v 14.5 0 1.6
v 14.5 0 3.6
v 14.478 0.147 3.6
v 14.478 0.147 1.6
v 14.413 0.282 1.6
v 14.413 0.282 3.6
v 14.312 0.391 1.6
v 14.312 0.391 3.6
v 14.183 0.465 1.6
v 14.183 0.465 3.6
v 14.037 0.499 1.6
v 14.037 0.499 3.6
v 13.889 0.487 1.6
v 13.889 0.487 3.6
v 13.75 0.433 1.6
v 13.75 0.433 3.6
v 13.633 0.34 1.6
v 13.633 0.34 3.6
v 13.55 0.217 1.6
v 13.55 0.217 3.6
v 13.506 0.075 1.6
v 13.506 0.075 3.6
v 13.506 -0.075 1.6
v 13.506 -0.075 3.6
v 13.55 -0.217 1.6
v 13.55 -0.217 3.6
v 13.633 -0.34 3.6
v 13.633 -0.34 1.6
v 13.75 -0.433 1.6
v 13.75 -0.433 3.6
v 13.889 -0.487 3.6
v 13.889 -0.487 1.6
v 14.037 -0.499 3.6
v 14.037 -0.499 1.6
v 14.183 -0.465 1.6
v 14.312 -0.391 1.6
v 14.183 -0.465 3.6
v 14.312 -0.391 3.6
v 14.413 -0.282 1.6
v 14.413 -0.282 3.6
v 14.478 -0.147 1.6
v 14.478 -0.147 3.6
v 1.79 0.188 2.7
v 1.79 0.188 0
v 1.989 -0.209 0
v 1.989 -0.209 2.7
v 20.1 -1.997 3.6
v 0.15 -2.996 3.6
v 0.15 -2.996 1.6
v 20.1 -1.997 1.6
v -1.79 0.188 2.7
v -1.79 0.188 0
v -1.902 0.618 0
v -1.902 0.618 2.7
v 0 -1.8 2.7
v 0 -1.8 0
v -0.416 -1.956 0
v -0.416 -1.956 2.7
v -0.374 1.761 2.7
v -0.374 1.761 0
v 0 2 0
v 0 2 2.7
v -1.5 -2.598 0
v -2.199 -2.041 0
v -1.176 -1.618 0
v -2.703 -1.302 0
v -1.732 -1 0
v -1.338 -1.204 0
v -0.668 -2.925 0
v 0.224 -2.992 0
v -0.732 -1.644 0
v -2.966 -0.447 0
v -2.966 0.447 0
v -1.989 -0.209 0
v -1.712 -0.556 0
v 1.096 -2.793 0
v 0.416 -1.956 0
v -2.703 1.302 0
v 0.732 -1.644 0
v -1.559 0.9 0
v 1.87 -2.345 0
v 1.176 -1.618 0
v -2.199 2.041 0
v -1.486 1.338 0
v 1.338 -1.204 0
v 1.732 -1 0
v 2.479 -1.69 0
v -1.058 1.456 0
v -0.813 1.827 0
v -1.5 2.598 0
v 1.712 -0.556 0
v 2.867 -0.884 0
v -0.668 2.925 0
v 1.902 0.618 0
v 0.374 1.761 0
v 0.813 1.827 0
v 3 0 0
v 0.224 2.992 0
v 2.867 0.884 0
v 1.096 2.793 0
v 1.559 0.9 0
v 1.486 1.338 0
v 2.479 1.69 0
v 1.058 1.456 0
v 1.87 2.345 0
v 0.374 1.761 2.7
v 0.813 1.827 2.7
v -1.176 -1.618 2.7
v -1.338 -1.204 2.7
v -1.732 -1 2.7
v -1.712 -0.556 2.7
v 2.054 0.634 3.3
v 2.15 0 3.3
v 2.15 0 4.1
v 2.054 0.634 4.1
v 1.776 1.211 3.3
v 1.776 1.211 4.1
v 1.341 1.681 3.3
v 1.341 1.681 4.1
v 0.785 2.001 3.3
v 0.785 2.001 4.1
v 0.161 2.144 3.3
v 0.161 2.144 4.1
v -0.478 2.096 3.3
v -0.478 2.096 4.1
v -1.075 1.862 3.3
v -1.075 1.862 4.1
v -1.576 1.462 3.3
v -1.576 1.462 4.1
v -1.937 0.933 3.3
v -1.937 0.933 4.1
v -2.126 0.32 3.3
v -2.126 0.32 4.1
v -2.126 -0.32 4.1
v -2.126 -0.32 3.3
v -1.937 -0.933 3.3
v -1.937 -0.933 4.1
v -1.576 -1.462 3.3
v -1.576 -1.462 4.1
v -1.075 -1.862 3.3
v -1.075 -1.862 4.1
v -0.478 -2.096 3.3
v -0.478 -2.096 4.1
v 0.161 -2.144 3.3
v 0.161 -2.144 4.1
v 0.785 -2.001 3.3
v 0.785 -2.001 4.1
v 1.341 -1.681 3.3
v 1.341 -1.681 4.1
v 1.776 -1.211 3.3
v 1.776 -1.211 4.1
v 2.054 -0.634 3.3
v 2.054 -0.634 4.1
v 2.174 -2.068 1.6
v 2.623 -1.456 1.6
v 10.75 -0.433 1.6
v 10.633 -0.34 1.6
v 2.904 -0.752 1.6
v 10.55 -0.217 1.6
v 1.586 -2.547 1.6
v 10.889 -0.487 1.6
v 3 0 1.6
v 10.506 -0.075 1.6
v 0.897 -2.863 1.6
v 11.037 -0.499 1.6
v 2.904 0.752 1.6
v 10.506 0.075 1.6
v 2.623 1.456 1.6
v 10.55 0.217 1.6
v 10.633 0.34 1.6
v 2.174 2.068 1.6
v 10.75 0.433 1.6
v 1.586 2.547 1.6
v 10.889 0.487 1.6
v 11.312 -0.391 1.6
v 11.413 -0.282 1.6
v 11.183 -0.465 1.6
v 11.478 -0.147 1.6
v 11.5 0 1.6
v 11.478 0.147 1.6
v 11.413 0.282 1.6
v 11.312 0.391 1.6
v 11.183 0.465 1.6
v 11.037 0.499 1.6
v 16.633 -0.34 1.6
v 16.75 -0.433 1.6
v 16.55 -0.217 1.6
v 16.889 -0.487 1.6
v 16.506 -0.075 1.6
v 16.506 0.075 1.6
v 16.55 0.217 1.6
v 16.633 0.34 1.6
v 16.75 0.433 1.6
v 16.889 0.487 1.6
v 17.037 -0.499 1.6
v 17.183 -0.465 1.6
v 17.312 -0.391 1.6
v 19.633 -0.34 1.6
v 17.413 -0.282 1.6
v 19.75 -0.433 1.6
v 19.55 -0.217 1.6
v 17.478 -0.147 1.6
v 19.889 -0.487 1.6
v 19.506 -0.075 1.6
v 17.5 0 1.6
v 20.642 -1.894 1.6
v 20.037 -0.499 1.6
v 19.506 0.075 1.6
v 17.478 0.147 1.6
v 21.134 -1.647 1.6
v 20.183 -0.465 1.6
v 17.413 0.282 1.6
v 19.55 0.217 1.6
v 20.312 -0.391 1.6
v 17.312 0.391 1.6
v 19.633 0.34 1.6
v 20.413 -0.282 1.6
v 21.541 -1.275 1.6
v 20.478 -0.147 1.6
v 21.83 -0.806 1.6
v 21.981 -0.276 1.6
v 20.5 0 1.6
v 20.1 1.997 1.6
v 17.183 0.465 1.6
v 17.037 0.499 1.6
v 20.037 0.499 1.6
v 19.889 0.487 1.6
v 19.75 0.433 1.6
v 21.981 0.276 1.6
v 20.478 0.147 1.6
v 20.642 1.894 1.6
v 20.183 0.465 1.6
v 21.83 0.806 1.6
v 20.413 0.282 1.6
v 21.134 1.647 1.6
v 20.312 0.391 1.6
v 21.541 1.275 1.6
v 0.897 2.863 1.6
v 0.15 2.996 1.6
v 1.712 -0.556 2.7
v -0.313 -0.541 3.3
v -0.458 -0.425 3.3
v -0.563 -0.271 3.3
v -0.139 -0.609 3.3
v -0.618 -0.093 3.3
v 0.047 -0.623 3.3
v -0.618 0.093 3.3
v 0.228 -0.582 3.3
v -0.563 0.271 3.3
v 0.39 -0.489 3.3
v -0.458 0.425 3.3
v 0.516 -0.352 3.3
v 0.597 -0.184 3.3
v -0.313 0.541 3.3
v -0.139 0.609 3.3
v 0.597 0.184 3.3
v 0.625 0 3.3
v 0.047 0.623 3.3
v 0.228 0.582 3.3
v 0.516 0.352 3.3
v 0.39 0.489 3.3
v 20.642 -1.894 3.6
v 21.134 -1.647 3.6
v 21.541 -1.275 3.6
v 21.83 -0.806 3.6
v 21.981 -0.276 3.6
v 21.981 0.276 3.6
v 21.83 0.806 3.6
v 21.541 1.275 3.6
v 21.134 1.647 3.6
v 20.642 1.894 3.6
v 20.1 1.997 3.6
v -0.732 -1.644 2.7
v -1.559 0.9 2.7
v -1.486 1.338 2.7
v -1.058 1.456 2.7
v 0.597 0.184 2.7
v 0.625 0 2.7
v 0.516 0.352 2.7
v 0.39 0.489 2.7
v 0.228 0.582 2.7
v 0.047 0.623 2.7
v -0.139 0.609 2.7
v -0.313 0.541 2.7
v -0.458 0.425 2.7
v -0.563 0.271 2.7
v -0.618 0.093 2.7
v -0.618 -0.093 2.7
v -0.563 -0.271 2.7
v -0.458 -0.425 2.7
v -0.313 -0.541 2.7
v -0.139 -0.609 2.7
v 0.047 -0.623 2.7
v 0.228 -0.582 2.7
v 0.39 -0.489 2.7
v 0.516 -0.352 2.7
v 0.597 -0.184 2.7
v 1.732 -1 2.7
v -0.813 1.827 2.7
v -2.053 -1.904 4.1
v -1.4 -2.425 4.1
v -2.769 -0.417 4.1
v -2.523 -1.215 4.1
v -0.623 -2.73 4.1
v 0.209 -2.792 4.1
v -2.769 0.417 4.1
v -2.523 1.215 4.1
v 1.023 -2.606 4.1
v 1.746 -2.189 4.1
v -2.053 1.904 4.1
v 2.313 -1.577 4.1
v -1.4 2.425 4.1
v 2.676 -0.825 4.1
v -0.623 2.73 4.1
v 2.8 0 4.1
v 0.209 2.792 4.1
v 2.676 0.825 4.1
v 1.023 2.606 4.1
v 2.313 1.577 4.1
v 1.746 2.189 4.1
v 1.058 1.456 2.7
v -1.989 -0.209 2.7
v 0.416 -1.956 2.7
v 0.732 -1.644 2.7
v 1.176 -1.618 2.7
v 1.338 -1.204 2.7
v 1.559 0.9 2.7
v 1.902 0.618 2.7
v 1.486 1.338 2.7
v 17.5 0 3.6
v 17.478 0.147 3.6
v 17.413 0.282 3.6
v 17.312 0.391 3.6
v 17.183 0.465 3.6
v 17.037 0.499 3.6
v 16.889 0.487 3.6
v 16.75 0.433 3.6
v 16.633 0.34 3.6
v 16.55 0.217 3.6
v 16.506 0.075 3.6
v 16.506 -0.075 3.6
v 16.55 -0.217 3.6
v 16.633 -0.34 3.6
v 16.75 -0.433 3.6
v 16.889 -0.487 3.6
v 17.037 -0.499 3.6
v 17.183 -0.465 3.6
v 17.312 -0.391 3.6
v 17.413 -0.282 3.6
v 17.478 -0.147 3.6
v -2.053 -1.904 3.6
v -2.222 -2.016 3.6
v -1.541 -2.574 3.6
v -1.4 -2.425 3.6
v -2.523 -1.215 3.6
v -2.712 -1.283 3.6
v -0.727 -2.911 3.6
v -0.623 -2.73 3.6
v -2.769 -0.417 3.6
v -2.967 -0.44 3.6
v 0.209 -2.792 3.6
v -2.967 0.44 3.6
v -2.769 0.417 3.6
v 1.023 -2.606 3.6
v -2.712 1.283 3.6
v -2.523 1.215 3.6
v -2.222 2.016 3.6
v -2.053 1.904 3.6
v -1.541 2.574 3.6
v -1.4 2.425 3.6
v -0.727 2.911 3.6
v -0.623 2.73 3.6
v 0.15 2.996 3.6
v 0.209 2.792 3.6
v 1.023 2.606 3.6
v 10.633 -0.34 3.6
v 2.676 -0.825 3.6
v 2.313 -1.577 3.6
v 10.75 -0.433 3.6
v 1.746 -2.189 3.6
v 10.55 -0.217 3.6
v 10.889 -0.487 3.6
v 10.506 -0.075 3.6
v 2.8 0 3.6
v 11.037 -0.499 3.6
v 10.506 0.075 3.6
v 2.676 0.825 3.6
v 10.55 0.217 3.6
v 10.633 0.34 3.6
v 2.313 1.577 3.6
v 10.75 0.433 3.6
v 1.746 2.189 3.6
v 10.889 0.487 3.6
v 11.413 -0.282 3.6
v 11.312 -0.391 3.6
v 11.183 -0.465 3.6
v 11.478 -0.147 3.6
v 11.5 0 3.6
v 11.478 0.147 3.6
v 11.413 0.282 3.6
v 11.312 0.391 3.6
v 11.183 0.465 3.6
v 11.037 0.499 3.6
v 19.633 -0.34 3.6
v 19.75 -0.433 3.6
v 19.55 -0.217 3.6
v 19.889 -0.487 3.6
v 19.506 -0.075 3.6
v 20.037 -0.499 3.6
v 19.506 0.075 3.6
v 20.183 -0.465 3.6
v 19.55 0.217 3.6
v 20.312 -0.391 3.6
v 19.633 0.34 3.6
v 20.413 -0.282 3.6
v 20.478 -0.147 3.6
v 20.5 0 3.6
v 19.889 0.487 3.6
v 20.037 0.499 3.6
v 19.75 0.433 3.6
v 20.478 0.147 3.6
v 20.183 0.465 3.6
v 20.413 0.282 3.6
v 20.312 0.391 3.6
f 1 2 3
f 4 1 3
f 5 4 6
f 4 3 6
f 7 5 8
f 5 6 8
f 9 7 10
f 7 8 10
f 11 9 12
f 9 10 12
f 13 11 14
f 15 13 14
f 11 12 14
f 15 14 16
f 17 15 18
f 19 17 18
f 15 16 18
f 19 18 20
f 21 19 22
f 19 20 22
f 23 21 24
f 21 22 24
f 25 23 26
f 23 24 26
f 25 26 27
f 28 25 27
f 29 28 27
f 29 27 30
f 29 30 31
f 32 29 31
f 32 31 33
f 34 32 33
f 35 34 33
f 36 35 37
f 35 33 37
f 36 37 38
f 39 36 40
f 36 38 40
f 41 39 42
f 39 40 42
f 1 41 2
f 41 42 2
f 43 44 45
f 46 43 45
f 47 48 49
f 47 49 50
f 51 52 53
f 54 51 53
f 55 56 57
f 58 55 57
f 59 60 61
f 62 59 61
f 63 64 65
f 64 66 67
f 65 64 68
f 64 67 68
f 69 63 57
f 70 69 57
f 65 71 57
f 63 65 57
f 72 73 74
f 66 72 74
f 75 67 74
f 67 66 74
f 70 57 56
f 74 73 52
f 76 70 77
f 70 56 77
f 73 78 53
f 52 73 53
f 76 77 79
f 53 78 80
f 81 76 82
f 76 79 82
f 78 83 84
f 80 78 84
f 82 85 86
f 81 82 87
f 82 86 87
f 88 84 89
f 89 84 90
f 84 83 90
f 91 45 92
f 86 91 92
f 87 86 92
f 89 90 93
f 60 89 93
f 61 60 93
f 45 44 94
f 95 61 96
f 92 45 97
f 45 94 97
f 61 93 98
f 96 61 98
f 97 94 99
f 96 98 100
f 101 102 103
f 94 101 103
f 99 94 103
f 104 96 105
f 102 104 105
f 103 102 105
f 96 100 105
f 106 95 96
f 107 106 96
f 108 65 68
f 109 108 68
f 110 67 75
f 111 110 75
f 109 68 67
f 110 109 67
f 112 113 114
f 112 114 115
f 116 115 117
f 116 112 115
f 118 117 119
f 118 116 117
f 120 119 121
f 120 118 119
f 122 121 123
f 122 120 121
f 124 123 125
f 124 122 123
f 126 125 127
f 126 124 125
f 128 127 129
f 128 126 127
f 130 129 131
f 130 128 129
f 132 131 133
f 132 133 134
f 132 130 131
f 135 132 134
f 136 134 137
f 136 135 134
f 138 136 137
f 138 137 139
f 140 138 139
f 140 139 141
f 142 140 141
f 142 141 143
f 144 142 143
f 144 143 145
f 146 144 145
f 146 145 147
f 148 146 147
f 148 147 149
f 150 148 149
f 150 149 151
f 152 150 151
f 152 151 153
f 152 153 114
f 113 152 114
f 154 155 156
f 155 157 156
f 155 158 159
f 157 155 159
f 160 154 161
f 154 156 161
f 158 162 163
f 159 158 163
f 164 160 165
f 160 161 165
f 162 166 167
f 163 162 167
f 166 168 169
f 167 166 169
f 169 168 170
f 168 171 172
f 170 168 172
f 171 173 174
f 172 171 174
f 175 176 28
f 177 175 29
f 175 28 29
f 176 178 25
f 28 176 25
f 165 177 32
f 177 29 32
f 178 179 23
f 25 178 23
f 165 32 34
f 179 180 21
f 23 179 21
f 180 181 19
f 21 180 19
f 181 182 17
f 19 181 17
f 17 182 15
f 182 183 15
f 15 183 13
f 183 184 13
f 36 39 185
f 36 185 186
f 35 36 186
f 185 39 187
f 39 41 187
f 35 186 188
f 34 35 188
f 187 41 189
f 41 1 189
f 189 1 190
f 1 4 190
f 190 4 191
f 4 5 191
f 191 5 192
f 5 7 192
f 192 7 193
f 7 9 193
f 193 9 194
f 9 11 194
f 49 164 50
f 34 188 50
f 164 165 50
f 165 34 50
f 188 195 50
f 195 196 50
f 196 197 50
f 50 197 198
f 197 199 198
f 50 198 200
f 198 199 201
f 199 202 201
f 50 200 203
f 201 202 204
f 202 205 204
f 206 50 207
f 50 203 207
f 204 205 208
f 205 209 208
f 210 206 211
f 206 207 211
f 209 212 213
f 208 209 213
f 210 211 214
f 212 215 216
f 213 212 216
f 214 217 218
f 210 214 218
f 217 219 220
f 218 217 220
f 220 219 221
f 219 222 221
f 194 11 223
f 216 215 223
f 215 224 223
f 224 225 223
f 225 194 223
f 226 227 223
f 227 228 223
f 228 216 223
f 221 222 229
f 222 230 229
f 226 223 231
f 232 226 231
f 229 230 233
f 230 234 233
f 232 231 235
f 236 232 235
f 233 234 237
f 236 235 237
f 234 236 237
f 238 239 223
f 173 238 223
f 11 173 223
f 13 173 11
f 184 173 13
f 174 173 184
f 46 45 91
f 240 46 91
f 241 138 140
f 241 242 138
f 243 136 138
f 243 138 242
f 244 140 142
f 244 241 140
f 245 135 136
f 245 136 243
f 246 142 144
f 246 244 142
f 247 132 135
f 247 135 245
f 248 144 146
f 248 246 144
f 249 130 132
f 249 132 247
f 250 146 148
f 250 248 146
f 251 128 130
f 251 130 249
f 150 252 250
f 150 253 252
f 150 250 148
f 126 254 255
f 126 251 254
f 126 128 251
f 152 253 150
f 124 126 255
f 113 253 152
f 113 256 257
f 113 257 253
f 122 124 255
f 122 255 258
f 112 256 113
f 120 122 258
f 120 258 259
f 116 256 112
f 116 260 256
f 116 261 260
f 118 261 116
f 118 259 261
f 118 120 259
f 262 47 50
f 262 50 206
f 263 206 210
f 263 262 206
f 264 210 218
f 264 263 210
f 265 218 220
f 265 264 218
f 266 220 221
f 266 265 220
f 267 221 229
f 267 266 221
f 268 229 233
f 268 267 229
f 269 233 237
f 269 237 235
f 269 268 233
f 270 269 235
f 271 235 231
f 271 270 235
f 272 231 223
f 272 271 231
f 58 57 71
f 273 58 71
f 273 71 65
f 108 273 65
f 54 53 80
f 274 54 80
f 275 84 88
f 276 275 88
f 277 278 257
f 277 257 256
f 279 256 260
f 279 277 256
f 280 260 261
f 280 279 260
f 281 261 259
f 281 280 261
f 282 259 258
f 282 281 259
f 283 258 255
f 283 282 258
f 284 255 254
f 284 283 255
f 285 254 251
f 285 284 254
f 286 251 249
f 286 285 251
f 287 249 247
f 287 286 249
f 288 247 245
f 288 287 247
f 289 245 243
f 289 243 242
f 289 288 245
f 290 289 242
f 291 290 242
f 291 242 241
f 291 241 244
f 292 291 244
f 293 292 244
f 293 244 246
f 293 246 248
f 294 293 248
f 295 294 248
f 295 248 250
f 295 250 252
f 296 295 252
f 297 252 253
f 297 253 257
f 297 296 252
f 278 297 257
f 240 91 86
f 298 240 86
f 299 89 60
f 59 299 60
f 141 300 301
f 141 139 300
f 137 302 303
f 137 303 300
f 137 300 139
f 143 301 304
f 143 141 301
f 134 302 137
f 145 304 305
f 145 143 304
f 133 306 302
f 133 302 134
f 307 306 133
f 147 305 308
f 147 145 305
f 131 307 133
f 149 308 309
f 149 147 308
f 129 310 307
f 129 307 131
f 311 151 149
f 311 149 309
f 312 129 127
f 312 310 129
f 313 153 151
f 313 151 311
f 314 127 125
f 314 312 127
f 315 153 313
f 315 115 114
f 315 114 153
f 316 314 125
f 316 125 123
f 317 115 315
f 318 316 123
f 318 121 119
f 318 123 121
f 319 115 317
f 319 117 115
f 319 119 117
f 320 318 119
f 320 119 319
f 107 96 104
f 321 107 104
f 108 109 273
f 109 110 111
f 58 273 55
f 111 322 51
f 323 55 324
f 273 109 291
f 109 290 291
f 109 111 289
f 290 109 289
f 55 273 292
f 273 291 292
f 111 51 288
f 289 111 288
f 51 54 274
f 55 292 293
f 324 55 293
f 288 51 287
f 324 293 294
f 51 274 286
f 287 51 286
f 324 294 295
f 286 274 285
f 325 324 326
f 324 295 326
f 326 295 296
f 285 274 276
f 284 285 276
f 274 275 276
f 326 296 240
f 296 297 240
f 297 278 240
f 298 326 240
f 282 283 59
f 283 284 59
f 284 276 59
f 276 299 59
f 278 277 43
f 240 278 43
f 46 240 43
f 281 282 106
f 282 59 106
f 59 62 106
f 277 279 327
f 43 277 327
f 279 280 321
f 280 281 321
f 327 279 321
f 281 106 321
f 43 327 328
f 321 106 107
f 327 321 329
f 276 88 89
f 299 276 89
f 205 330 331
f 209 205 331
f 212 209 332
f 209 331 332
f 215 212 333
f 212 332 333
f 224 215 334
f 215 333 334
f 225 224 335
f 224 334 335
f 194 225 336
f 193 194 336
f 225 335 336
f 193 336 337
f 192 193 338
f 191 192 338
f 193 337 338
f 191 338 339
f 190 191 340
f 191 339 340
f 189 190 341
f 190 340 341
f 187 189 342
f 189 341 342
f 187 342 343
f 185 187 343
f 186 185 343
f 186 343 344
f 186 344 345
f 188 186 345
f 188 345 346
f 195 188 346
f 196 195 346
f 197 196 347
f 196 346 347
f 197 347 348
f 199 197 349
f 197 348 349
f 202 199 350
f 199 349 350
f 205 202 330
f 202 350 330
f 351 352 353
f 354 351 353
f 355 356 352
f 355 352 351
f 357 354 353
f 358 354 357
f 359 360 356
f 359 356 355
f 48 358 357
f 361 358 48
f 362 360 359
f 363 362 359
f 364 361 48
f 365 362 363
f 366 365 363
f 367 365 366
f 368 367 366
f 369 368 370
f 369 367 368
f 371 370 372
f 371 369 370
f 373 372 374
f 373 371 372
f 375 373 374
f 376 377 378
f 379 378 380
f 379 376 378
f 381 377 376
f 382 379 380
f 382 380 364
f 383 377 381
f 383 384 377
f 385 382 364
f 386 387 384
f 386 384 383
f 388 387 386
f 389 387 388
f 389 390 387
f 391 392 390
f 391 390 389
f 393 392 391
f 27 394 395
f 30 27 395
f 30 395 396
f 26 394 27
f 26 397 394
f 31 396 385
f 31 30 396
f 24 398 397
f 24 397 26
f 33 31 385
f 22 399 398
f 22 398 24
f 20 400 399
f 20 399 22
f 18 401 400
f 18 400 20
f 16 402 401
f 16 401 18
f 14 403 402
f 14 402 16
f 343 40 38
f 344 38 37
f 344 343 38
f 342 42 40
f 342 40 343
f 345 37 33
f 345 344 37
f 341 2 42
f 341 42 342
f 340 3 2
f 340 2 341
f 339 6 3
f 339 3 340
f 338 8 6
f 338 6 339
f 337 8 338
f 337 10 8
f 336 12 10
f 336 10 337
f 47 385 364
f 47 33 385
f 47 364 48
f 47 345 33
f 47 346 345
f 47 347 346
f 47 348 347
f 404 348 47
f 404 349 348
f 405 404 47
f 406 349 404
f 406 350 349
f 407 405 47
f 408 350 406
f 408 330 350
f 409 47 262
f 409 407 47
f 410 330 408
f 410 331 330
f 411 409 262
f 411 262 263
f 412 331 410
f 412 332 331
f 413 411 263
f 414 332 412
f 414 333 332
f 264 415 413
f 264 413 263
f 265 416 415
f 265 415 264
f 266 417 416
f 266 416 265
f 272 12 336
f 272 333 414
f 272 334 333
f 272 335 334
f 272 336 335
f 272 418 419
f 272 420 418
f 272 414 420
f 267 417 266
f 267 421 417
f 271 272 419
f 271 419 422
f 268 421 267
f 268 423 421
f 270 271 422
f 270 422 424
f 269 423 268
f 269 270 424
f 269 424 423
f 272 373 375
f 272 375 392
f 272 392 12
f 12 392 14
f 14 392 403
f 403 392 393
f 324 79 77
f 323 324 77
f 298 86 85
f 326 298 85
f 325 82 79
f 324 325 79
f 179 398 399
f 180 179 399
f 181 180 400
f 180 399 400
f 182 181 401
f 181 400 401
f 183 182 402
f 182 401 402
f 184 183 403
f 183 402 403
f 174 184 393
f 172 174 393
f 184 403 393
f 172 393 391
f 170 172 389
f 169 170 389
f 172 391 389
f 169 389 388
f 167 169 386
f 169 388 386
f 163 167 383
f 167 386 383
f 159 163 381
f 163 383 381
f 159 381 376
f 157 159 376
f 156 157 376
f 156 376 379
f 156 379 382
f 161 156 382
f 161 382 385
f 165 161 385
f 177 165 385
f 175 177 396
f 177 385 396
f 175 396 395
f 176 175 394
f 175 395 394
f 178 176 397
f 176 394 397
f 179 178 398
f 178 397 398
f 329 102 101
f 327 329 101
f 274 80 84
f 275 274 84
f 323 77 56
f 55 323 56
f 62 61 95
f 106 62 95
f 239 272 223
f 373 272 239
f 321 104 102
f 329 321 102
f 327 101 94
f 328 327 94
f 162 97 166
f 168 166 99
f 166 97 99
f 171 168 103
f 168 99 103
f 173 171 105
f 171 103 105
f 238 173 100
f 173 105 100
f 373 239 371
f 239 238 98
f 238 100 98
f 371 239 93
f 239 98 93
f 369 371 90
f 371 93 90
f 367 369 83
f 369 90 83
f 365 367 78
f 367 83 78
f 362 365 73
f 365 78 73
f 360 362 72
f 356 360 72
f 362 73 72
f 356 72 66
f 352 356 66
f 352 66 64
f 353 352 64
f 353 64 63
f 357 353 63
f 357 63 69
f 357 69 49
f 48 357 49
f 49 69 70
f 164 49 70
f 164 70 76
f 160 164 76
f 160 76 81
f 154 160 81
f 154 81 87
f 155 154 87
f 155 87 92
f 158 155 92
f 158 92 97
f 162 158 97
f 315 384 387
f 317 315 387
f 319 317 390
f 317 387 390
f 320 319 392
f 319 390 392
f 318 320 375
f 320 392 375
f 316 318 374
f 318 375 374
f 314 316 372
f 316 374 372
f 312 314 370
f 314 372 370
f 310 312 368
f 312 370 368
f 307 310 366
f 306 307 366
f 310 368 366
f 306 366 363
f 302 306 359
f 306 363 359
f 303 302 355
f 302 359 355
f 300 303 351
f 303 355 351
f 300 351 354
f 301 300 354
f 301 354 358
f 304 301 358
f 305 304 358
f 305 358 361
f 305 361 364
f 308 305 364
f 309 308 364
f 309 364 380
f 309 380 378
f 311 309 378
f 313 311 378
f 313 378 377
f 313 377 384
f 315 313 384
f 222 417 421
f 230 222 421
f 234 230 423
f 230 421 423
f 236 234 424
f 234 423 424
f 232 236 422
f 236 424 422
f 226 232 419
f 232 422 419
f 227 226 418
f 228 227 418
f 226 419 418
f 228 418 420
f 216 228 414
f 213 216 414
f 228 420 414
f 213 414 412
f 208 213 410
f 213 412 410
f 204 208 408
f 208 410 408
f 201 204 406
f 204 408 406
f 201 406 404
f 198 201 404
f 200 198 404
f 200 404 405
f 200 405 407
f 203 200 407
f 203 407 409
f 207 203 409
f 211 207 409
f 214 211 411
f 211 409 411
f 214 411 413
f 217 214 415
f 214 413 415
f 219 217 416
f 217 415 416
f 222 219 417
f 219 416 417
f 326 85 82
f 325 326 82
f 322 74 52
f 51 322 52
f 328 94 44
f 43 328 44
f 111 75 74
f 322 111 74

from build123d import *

# Parameters (mm, degrees)
SKETCH2_R           = 3
SKETCH2_R_2         = 2.8
BOSS_EXTRUDE1_DEPTH = 3.6
SKETCH2_3_R         = 2.8
SKETCH2_3_R_2       = 2.15
BOSS_EXTRUDE2_DEPTH = 4.1
BOSS_EXTRUDE3_START = 2.7
SKETCH2_4_R         = 2.15
SKETCH2_4_R_2       = 0.625
BOSS_EXTRUDE3_DEPTH = 0.6
SKETCH2_5_R         = 2.15
BOSS_EXTRUDE4_DEPTH = 2.7
BOSS_EXTRUDE5_START = 3.6
SKETCH2_6_R         = 0.5
BOSS_EXTRUDE5_DEPTH = 2


with BuildPart() as part:
    # Sketch2 → Boss-Extrude1 (new body)
    with BuildSketch(Plane.XY):
        Circle(SKETCH2_R)
        Circle(SKETCH2_R_2, mode=Mode.SUBTRACT)
    extrude(amount=BOSS_EXTRUDE1_DEPTH)

    # Sketch2<3> → Boss-Extrude2 (add)
    with BuildSketch(Plane.XY):
        Circle(SKETCH2_3_R)
        Circle(SKETCH2_3_R_2, mode=Mode.SUBTRACT)
    extrude(amount=BOSS_EXTRUDE2_DEPTH)

    # Sketch2<4> → Boss-Extrude3 (add)
    with BuildSketch(Plane.XY.offset(BOSS_EXTRUDE3_START)):
        Circle(SKETCH2_4_R)
        Circle(SKETCH2_4_R_2, mode=Mode.SUBTRACT)
    extrude(amount=BOSS_EXTRUDE3_DEPTH)

    # Sketch2<5> → Boss-Extrude4 (add)
    with BuildSketch(Plane.XY):
        Circle(SKETCH2_5_R)
        Polygon((-0.374241043, 1.760665681), (0, 2), (0.374241043, 1.760665681), (0.813473286, 1.827090915), (1.058013454, 1.45623059), (1.486289651, 1.338261213), (1.558845727, 0.9), (1.902113033, 0.618033989), (1.790139412, 0.188151234), (1.989043791, -0.209056927), (1.711901729, -0.55623059), (1.732050808, -1), (1.337660686, -1.204435091), (1.175570505, -1.618033989), (0.732125958, -1.644381824), (0.415823382, -1.956295201), (0, -1.8), (-0.415823382, -1.956295201), (-0.732125958, -1.644381824), (-1.175570505, -1.618033989), (-1.337660686, -1.204435091), (-1.732050808, -1), (-1.711901729, -0.55623059), (-1.989043791, -0.209056927), (-1.790139412, 0.188151234), (-1.902113033, 0.618033989), (-1.558845727, 0.9), (-1.486289651, 1.338261213), (-1.058013454, 1.45623059), (-0.813473286, 1.827090915), align=None, mode=Mode.SUBTRACT)
    extrude(amount=BOSS_EXTRUDE4_DEPTH)

    # Sketch2<6> → Boss-Extrude5 (add)
    with BuildSketch(Plane.XY.offset(BOSS_EXTRUDE5_START)):
        with BuildLine():
            Line((20.1, 1.997498436), (0.15, 2.996247653))
            ThreePointArc((0.15, 2.996247653), (3, 0), (0.15, -2.996247653))
            Line((0.15, -2.996247653), (20.1, -1.997498436))
            ThreePointArc((20.1, -1.997498436), (22, 0), (20.1, 1.997498436))
        make_face()
        with Locations((11, 0)):
            Circle(SKETCH2_6_R, mode=Mode.SUBTRACT)
        with Locations((14, 0)):
            Circle(SKETCH2_6_R, mode=Mode.SUBTRACT)
        with Locations((17, 0)):
            Circle(SKETCH2_6_R, mode=Mode.SUBTRACT)
        with Locations((20, 0)):
            Circle(SKETCH2_6_R, mode=Mode.SUBTRACT)
    extrude(amount=-BOSS_EXTRUDE5_DEPTH)


solid = part.part
